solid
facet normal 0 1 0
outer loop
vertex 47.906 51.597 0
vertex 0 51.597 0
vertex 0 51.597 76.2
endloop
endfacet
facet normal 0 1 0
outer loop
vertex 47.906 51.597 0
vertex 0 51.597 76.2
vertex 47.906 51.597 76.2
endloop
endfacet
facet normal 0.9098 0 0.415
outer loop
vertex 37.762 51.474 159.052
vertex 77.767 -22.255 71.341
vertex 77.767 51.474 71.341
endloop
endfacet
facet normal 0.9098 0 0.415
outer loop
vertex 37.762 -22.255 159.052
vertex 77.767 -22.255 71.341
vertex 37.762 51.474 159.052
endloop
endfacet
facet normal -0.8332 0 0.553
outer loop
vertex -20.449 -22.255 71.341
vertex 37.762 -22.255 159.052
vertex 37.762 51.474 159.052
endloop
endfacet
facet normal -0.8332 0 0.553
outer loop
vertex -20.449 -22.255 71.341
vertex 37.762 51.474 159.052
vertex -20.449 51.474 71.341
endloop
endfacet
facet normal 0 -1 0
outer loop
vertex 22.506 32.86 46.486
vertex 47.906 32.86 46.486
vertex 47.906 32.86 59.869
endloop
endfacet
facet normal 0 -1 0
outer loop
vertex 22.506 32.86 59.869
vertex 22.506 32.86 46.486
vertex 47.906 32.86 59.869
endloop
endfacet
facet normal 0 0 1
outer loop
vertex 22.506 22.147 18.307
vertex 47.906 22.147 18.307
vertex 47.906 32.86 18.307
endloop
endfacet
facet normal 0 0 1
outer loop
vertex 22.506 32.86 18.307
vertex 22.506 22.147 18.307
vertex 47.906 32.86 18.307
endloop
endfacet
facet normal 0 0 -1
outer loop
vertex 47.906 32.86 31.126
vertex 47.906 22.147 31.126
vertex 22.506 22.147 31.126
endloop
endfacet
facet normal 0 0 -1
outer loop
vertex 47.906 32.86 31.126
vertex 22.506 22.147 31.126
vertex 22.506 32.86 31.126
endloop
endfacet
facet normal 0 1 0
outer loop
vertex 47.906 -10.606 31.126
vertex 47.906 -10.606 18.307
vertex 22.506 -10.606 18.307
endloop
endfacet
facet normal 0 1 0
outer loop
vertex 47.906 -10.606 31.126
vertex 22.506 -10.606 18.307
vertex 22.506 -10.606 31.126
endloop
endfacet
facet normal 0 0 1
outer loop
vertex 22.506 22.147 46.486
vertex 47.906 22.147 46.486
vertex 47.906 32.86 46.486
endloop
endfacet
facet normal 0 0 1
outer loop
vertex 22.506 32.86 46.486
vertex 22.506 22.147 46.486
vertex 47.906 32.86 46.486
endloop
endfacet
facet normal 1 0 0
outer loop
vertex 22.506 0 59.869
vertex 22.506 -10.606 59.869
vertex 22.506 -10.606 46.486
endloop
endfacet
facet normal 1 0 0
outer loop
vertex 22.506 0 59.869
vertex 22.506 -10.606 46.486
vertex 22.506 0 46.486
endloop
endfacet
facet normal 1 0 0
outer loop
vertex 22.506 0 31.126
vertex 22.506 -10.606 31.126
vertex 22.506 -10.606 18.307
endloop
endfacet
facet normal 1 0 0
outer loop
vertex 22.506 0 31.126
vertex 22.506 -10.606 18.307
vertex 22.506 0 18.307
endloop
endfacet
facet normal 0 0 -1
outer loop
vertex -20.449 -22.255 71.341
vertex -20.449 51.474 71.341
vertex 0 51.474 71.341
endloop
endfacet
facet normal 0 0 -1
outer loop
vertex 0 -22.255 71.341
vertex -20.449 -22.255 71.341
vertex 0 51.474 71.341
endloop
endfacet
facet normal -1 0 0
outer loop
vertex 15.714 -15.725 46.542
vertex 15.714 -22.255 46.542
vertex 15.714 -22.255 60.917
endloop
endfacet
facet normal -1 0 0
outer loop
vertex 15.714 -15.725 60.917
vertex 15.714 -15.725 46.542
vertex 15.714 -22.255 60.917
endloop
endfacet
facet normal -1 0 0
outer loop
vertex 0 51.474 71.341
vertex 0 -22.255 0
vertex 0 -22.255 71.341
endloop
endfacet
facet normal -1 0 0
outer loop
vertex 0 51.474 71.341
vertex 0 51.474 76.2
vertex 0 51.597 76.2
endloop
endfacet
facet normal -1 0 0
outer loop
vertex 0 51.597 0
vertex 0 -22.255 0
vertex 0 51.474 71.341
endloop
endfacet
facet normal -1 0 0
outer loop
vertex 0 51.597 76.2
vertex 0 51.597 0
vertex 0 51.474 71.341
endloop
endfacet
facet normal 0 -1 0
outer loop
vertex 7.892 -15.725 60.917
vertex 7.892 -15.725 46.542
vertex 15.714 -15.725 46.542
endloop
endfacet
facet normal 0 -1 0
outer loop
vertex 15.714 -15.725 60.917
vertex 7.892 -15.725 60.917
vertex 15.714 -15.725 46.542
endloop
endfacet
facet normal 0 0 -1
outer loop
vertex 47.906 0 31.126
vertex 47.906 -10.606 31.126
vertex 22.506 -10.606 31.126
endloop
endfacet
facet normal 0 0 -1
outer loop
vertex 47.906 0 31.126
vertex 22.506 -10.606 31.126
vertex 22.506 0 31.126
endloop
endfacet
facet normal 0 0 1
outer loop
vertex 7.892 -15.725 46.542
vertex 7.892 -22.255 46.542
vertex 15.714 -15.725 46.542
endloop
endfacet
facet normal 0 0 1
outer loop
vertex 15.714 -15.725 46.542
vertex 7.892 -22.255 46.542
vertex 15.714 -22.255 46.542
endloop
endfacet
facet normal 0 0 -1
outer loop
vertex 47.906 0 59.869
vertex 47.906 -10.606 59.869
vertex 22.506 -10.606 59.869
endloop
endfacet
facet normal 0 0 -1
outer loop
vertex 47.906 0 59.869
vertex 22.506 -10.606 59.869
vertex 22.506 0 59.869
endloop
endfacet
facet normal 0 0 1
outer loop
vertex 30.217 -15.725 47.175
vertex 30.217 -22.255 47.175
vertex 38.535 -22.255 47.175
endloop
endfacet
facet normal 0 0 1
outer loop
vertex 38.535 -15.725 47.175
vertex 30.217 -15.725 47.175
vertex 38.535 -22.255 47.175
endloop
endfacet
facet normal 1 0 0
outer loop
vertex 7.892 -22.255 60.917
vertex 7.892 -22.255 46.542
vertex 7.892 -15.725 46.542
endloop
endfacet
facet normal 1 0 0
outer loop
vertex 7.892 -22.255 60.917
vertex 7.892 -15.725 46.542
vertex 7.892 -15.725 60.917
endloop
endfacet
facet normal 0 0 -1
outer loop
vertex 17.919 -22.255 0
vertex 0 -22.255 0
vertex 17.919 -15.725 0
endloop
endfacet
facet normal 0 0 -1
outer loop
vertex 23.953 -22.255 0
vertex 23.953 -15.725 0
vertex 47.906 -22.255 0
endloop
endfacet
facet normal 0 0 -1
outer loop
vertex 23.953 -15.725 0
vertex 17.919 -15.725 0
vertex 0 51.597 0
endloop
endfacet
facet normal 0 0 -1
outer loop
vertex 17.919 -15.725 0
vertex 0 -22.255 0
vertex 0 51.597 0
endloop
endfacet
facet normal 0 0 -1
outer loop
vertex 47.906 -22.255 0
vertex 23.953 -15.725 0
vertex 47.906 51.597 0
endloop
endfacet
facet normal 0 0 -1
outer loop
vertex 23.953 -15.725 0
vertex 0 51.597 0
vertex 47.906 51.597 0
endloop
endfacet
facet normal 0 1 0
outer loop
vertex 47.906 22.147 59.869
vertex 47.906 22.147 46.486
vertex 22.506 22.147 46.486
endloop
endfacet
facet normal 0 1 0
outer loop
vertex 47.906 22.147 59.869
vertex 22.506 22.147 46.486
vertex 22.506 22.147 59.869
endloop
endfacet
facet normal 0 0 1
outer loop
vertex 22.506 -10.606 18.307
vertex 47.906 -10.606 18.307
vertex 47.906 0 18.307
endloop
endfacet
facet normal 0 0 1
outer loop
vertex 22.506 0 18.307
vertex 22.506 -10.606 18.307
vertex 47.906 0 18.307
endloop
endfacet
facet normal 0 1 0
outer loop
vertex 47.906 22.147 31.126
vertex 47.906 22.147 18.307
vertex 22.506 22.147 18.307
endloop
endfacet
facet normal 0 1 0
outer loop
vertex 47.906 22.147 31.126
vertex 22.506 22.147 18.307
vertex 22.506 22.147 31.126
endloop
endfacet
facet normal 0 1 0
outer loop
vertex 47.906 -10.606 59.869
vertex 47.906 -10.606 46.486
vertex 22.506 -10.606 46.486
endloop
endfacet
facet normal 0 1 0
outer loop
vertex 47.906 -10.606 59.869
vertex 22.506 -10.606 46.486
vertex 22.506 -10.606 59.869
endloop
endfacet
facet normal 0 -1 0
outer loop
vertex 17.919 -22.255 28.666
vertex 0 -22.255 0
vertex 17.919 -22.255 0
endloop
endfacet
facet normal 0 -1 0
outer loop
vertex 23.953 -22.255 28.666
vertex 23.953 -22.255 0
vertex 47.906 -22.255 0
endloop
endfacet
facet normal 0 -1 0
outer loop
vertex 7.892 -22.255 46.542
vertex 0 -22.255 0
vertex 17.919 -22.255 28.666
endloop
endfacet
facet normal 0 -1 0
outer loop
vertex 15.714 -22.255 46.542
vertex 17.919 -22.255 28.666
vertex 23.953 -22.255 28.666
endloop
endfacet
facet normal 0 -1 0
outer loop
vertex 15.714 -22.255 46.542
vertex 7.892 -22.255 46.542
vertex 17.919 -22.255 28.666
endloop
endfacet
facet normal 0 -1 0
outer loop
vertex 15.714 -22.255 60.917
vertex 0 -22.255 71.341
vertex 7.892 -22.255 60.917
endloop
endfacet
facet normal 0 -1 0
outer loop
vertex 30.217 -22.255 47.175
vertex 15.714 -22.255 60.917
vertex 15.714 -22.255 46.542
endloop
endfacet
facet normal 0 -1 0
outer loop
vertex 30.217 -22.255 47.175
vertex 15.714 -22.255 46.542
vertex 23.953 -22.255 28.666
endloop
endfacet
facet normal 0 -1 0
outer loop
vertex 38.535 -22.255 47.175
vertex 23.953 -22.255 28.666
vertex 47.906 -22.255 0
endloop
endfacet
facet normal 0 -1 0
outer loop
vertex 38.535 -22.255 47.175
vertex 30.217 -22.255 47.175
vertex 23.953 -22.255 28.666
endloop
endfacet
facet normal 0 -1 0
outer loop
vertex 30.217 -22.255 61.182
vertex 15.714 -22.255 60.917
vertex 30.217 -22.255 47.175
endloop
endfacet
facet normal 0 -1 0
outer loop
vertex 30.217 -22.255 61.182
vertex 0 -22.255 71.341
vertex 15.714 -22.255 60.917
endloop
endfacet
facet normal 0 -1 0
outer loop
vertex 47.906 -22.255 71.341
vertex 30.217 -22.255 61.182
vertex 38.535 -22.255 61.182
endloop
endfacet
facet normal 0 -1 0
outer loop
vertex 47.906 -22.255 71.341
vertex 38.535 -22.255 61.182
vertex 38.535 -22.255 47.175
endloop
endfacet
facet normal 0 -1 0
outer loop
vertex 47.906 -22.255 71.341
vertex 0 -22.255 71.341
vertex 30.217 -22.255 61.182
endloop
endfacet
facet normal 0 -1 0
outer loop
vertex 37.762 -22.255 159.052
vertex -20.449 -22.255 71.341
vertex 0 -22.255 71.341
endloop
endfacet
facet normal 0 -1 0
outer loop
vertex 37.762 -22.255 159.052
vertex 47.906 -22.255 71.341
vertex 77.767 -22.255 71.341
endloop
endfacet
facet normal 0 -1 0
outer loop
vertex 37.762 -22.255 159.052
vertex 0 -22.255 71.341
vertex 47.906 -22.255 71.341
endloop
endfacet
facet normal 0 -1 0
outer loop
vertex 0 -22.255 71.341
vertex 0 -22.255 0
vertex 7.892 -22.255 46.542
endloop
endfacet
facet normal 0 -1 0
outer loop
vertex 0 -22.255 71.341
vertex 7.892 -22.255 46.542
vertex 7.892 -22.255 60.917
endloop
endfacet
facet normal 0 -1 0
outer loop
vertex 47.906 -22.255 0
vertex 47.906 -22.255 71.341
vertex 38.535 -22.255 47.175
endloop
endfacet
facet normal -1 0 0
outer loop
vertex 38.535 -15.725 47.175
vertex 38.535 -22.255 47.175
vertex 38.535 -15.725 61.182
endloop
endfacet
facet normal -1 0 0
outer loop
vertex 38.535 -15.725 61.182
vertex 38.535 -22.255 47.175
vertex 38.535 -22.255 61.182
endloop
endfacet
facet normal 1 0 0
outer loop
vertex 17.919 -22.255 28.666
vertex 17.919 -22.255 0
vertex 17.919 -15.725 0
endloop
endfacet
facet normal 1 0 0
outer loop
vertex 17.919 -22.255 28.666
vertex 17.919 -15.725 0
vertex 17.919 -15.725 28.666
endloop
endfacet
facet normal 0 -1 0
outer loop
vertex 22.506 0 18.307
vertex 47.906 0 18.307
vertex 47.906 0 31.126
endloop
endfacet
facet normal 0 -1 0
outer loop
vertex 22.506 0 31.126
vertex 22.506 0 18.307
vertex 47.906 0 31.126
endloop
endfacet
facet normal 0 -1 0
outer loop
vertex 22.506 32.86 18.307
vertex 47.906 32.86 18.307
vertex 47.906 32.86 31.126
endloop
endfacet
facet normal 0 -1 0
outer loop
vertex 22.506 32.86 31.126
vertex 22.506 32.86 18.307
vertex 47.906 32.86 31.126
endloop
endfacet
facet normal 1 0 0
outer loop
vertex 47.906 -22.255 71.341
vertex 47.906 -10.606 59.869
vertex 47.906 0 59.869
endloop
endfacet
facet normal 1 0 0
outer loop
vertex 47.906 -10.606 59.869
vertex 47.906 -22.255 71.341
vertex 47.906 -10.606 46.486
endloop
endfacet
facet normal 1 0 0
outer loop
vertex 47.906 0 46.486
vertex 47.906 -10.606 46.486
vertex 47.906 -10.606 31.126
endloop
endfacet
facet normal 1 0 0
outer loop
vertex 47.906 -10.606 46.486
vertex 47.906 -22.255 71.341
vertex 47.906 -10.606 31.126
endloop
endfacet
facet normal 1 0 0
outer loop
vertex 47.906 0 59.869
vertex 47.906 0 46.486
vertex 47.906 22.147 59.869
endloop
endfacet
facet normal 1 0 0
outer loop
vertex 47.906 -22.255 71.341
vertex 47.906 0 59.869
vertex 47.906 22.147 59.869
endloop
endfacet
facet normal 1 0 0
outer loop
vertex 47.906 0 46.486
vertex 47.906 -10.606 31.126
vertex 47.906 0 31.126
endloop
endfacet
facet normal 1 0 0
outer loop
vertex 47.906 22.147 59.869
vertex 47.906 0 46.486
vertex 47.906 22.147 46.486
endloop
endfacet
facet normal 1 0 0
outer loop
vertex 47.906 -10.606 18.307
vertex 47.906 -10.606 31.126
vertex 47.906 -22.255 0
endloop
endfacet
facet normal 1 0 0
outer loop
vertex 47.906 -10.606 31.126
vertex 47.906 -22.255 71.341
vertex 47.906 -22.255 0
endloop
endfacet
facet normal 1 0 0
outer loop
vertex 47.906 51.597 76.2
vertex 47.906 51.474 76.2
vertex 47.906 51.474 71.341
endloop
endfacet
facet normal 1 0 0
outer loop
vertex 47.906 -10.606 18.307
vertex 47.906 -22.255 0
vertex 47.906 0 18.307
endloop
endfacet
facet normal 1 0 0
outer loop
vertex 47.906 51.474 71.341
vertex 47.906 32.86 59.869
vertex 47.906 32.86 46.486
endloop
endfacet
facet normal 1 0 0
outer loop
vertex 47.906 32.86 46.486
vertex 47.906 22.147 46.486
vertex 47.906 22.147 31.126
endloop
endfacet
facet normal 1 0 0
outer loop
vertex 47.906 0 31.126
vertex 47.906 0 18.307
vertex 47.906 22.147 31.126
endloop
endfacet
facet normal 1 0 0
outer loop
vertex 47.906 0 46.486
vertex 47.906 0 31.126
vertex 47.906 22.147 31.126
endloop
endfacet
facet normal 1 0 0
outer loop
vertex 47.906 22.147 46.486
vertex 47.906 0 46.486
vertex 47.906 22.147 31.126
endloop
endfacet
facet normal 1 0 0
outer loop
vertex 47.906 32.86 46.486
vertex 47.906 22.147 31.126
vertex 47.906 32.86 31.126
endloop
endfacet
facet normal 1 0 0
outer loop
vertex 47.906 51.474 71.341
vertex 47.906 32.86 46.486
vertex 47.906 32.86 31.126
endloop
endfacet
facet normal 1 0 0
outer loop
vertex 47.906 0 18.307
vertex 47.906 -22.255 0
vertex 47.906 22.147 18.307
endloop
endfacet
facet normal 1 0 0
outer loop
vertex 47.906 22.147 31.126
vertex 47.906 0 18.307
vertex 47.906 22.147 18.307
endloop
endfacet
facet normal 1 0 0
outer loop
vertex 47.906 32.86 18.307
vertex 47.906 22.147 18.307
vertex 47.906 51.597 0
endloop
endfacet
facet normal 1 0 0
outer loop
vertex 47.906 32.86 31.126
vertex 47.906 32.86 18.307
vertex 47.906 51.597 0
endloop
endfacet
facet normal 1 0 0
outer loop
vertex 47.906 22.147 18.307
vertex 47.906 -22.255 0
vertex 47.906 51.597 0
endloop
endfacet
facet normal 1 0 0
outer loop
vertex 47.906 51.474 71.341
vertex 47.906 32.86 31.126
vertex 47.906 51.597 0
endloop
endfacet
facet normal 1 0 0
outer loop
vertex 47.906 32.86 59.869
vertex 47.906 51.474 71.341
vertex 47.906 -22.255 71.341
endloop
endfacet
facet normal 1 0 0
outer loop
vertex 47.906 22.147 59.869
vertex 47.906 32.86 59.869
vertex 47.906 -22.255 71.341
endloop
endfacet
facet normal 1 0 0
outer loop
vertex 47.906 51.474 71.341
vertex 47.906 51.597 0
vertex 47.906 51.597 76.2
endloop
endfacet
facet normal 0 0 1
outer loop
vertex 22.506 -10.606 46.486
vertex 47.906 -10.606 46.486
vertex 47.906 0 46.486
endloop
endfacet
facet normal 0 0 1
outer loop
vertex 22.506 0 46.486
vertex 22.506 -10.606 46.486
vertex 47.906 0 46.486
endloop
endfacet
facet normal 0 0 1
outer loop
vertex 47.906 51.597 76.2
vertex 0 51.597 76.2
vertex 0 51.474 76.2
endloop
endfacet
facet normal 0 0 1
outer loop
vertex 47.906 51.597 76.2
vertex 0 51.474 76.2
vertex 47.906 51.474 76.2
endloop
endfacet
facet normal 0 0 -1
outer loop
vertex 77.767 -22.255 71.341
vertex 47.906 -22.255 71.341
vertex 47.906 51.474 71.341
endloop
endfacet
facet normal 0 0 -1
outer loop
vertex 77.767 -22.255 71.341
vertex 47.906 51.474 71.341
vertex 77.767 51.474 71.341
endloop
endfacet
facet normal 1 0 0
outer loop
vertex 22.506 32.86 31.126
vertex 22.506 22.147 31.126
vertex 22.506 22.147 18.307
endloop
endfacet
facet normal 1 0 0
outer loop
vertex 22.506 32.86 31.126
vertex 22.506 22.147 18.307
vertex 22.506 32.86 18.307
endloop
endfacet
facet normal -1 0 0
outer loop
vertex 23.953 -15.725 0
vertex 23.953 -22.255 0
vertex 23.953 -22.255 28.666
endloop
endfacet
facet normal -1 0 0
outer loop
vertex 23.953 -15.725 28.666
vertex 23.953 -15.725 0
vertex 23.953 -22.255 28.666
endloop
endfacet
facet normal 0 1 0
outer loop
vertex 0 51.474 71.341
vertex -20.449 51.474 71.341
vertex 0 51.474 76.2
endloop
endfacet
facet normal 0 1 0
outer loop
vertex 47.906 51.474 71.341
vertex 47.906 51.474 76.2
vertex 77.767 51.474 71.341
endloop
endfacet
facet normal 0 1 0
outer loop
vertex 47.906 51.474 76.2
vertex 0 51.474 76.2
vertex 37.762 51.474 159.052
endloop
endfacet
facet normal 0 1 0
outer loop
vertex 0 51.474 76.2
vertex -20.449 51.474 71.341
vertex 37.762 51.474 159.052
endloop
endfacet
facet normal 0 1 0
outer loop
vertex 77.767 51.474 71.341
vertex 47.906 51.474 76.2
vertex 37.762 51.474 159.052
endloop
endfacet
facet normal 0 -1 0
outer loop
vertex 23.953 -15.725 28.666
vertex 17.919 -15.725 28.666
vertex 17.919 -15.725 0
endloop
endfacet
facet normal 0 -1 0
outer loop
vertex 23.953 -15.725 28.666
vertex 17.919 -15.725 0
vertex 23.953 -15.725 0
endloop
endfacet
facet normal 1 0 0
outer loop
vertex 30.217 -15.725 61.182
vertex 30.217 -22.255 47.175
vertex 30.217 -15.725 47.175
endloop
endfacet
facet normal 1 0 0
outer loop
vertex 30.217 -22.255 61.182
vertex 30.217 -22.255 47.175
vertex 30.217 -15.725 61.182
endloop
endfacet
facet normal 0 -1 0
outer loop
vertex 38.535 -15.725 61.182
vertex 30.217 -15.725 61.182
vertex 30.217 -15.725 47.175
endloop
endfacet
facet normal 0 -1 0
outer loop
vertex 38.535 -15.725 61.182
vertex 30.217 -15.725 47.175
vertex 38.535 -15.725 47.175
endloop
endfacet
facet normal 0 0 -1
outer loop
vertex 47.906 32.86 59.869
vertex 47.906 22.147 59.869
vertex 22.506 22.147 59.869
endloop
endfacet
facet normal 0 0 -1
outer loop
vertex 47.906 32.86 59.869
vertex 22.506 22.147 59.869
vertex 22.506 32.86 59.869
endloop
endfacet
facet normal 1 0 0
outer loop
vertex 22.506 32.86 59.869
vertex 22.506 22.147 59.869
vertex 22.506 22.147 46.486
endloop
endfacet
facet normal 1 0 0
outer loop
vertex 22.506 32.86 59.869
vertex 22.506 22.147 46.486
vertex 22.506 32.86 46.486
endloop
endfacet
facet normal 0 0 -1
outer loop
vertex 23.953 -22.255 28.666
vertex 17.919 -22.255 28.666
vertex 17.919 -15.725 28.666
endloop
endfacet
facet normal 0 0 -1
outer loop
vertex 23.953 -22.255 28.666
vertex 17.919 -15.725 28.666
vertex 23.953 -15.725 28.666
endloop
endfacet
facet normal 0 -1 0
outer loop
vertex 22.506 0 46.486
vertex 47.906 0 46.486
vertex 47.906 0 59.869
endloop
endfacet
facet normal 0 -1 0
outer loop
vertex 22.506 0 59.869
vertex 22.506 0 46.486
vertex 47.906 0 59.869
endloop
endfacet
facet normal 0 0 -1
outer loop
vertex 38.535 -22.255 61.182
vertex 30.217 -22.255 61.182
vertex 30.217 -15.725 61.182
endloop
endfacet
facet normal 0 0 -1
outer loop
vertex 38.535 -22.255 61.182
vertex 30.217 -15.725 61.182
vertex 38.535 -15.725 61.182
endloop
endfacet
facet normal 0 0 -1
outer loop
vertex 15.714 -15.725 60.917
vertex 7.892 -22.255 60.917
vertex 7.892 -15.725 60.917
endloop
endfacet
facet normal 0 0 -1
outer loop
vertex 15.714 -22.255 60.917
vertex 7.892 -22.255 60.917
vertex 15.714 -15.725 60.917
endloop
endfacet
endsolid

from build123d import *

# Parameters (mm, degrees)
F0_W     = 47.9057580233
F0_H     = 73.8517567515
F1_DEPTH = 76.2
F3_DEPTH = 73.7290531397
F4_W     = 7.8228898346
F4_H     = 14.375641942
F4_W_2   = 8.3178766072
F4_H_2   = 14.0072628856
F4_W_3   = 6.03377074
F4_H_3   = 28.6656171083
F5_DEPTH = 6.5299868584
F6_W     = 10.6063969433
F6_H     = 13.3831351995
F6_H_2   = 12.8184799105
F6_W_2   = 10.7133537531
F7_DEPTH = 25.4


with BuildPart() as f1:
    # F0 (on Top) → F1 (new body)
    with BuildSketch(Plane.XY):
        with Locations((23.9528790116, 14.6708004177)):
            Rectangle(F0_W, F0_H)
    extrude(amount=F1_DEPTH)

    # F2 (on face) → F3 (join)
    with BuildSketch(Plane.XZ.offset(22.2550779581)):
        Polygon((37.7622656524, 159.051656723), (-20.4486101866, 71.3405758142), (0, 71.3405758142), (0, 76.2), (47.9057580233, 76.2), (47.9057580233, 71.3405758142), (77.7672529221, 71.3405758142), align=None)
    extrude(amount=-F3_DEPTH)

    # F4 (on face) → F5 (cut)
    with BuildSketch(Plane.XZ.offset(22.2550779581)):
        with Locations((11.8029844016, 53.7293627858)):
            Rectangle(F4_W, F4_H)
        with Locations((34.3761388212, 54.1785098612)):
            Rectangle(F4_W_2, F4_H_2)
        with Locations((20.9359936416, 14.3328085542)):
            Rectangle(F4_W_3, F4_H_3)
    extrude(amount=-F5_DEPTH, mode=Mode.SUBTRACT)

    # F6 (on face) → F7 (cut)
    with BuildSketch(Plane.YZ.offset(47.9057580233)):
        with Locations((-5.3031984717, 53.1773492694)):
            Rectangle(F6_W, F6_H)
        with Locations((-5.3031984717, 24.7165327892)):
            Rectangle(F6_W, F6_H_2)
        with Locations((27.5034122169, 24.7165327892)):
            Rectangle(F6_W_2, F6_H_2)
        with Locations((27.5034122169, 53.1773492694)):
            Rectangle(F6_W_2, F6_H)
    extrude(amount=-F7_DEPTH, mode=Mode.SUBTRACT)


solid = f1.part
